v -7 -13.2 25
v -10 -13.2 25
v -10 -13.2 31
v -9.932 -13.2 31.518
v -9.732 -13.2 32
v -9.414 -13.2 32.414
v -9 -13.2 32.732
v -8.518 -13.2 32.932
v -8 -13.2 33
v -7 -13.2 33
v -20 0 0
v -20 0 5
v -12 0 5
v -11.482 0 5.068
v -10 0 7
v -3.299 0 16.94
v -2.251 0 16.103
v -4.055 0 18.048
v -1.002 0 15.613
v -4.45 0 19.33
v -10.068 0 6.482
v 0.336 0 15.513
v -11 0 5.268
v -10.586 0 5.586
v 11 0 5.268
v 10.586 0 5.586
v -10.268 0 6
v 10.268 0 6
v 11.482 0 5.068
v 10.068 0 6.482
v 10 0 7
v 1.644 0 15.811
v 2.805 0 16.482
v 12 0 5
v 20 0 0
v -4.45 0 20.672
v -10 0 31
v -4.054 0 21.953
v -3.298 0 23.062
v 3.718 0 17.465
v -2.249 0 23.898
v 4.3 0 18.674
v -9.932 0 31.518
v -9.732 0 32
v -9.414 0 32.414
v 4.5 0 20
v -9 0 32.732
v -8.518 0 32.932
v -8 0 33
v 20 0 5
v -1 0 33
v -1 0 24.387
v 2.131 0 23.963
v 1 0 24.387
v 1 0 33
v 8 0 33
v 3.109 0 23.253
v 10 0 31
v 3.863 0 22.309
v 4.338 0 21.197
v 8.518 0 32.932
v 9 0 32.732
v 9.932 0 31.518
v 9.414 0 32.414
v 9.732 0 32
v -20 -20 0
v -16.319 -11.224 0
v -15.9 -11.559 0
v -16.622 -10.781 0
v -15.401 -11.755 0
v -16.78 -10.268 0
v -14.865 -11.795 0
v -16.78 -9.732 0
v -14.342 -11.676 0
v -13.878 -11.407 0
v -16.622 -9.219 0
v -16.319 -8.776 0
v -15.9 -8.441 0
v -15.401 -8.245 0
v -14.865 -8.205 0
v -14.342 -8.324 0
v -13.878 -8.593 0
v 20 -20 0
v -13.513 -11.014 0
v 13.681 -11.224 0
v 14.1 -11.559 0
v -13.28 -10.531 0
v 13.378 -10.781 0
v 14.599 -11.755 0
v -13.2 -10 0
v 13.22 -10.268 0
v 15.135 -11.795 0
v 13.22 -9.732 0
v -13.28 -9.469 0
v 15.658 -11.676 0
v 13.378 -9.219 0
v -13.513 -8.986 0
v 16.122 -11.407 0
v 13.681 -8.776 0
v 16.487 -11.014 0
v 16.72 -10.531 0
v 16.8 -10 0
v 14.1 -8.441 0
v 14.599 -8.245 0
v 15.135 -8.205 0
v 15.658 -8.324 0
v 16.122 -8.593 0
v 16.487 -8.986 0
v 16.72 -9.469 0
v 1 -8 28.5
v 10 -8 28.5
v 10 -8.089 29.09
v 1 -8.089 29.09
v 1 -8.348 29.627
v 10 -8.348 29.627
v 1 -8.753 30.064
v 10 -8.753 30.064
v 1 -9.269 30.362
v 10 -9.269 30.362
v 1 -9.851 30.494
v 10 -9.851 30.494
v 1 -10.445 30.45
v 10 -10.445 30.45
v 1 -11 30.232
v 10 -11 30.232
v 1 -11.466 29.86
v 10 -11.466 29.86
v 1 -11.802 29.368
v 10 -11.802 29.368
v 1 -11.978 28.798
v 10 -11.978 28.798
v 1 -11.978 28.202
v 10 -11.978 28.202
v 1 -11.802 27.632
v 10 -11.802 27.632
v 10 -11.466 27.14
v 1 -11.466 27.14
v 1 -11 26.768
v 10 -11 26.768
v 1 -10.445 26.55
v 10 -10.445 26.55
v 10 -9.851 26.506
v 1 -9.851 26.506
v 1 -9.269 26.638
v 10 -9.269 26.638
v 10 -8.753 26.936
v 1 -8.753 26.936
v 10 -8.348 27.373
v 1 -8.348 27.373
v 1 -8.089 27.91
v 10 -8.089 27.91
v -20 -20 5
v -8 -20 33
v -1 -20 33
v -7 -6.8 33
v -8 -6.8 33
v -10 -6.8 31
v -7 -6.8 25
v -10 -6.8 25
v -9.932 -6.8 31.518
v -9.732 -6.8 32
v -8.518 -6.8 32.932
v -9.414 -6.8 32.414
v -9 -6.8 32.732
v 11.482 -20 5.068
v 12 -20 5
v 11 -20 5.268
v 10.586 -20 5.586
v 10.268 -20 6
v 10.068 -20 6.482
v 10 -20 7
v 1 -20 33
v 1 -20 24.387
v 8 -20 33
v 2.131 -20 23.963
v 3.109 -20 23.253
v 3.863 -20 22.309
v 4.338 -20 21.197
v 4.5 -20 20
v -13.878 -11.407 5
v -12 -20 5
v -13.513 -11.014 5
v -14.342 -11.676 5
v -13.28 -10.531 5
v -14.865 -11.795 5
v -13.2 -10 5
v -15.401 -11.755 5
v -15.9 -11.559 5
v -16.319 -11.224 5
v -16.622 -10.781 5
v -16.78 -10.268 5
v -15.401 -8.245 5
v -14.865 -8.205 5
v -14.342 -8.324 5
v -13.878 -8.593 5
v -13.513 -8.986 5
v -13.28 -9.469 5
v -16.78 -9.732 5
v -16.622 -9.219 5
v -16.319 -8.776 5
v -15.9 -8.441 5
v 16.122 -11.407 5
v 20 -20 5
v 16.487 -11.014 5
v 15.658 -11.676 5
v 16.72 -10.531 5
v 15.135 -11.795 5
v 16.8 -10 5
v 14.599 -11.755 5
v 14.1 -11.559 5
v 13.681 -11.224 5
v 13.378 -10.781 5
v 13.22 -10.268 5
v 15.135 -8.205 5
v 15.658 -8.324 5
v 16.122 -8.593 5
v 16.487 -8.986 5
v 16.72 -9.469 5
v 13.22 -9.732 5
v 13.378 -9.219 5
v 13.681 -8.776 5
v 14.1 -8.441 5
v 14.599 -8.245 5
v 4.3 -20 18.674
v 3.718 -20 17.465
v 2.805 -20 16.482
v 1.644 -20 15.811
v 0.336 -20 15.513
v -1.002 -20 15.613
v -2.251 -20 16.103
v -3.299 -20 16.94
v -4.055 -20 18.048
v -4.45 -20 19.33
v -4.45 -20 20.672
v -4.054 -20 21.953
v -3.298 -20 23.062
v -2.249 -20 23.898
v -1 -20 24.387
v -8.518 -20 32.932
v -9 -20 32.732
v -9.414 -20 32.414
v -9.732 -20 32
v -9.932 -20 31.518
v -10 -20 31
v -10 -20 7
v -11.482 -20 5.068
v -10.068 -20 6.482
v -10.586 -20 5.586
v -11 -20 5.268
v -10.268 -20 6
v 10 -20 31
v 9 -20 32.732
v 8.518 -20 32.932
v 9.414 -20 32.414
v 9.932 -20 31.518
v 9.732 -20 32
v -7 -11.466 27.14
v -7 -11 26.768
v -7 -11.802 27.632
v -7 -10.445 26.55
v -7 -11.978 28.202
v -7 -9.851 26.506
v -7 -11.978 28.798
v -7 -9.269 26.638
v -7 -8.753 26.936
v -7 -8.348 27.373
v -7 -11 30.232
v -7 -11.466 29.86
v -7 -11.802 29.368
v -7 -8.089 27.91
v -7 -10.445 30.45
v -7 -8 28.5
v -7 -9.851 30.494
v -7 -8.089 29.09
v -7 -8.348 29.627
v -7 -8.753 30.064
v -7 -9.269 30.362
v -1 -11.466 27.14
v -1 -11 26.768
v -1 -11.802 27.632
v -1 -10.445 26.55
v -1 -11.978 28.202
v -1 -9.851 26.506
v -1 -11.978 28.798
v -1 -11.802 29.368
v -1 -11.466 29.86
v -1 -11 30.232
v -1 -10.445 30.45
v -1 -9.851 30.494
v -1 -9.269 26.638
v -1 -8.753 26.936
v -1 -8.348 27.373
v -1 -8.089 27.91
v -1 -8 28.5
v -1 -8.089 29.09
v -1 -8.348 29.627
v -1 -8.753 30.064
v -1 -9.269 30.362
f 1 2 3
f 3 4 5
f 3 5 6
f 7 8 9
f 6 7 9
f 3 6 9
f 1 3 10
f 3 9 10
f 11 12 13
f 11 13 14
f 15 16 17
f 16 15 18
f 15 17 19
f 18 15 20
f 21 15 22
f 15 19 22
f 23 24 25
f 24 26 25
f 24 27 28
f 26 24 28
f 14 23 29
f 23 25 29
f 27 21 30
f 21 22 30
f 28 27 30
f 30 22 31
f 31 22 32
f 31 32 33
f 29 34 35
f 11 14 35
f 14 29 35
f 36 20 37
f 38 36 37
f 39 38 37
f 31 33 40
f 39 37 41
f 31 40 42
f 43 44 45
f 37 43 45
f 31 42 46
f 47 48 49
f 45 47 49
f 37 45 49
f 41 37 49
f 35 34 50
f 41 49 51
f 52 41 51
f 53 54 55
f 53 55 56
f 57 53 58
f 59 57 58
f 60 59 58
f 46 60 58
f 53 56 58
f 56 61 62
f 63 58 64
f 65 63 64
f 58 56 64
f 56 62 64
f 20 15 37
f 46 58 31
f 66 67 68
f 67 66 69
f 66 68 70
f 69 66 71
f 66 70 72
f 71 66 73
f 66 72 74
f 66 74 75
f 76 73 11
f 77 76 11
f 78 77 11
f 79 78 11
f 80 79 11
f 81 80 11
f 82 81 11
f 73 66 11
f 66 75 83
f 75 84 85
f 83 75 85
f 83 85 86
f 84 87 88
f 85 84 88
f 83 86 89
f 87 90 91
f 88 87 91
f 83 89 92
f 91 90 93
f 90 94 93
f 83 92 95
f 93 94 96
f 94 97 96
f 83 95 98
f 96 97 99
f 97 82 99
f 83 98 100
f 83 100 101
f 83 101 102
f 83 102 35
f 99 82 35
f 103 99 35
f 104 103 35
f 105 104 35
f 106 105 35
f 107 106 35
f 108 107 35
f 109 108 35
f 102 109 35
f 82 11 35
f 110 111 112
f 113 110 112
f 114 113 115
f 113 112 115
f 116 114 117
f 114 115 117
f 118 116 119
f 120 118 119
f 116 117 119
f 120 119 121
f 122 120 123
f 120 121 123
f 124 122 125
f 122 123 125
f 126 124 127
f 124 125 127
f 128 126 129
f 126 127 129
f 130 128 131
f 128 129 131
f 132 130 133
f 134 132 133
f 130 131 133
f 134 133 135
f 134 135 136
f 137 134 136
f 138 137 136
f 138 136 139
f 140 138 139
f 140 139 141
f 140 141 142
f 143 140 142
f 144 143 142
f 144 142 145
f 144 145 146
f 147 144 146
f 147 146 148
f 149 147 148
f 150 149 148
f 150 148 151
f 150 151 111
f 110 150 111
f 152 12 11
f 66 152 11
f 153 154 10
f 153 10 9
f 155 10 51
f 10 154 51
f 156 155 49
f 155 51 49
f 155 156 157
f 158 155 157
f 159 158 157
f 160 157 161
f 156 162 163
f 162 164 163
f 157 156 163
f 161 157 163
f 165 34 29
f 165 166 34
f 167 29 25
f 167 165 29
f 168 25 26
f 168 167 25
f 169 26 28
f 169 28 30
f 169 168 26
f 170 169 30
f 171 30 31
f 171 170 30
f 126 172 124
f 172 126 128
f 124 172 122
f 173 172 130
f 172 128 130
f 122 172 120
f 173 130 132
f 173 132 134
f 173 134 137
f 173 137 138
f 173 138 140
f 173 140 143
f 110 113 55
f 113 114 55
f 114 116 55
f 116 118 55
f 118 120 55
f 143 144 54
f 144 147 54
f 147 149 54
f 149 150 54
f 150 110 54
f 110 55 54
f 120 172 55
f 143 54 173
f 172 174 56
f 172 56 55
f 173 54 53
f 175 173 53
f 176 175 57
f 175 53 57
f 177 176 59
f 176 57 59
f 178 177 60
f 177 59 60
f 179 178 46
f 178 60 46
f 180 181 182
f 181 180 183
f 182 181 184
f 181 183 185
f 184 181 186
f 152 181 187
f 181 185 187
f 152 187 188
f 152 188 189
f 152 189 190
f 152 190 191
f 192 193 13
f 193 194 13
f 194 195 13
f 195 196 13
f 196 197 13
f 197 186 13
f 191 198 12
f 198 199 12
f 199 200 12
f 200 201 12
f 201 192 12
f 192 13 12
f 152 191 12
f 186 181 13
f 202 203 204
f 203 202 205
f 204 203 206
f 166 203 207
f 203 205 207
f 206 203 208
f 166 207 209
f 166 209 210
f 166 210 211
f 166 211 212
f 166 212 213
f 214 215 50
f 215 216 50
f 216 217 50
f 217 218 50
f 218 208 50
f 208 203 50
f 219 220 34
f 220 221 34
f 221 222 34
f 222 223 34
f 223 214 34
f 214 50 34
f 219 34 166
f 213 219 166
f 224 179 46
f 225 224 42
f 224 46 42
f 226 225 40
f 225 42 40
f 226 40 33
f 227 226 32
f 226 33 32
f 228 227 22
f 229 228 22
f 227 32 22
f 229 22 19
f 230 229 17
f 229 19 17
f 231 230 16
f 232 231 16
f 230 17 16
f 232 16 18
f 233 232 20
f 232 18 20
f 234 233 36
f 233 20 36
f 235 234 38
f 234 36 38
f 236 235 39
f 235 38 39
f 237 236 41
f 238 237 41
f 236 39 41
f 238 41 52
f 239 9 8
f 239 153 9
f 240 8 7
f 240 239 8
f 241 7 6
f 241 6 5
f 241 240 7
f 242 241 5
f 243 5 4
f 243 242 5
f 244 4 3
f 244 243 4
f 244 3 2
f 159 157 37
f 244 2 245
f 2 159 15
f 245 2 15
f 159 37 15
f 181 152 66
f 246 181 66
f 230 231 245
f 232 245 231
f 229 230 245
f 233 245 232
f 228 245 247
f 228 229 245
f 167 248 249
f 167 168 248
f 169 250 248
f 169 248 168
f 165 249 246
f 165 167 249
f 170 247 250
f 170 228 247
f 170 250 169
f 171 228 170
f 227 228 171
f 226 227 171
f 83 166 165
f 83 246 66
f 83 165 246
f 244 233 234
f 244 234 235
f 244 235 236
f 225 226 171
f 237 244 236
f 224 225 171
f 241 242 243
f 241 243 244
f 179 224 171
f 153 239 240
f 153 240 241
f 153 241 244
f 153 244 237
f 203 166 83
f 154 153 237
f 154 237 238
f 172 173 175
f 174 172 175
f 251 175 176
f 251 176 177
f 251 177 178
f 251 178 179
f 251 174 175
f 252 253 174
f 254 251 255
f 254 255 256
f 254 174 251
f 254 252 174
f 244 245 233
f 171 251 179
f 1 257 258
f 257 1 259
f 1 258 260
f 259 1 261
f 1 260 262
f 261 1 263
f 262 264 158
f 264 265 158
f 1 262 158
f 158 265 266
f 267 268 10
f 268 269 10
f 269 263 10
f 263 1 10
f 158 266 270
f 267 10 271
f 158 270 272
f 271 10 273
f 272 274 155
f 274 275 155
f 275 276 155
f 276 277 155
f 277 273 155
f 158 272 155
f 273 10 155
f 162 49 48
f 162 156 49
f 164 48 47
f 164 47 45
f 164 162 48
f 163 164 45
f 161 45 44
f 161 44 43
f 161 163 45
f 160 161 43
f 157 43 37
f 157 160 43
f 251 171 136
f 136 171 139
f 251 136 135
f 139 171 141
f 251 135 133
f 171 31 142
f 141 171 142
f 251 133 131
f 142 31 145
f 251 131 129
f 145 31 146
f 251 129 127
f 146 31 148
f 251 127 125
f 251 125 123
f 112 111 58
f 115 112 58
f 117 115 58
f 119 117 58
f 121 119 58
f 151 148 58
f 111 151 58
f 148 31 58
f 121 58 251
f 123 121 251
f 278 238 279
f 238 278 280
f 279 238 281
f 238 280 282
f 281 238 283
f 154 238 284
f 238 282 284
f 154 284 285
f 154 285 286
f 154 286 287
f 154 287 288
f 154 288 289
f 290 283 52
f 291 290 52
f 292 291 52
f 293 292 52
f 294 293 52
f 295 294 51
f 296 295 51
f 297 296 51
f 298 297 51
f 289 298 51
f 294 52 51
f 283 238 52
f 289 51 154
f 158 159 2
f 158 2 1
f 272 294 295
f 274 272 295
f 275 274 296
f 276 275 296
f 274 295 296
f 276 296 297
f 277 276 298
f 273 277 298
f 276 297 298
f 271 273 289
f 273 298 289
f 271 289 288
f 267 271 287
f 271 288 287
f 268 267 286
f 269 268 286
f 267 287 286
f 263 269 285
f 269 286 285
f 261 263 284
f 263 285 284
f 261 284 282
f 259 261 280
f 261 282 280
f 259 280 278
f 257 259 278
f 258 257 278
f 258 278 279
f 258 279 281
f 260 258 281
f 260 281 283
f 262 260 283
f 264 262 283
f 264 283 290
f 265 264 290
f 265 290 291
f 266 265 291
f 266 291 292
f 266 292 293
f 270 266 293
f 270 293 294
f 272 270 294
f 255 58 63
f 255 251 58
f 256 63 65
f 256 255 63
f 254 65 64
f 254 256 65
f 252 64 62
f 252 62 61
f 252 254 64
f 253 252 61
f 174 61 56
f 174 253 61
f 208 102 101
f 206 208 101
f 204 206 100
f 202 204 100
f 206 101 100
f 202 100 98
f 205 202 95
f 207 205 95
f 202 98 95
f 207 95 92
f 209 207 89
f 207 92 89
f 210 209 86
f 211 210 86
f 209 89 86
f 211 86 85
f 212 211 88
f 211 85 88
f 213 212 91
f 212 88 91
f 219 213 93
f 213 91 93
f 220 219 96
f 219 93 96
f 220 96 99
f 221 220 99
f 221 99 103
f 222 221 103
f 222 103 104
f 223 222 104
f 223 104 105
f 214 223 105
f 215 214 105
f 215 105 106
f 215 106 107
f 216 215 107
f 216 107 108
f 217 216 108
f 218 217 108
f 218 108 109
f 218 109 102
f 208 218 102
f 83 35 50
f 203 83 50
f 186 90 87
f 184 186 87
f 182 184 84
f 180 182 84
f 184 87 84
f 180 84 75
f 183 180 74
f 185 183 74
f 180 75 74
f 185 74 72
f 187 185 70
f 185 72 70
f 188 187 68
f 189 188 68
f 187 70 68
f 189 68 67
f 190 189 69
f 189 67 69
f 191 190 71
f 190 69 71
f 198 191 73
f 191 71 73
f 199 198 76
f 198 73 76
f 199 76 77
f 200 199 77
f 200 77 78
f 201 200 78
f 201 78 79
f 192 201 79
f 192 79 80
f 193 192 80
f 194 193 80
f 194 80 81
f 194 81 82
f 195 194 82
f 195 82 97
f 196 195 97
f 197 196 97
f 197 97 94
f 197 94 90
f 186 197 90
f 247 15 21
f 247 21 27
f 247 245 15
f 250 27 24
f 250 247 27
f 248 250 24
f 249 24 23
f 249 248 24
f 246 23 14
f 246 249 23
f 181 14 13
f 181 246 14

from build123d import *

# Parameters (mm, degrees)
F1_DEPTH = 20
F2_R     = 2
F3_DEPTH = 25
F5_DEPTH = 8
F6_R     = 1.8
F7_DEPTH = 25
F8_R     = 2


with BuildPart() as f1:
    # F0 (on Front) → F1 (new body)
    with BuildSketch(Plane.XZ):
        with BuildLine():
            Line((-1, 33), (-10, 33))
            Line((-10, 33), (-10, 5))
            Line((-10, 5), (-20, 5))
            Line((-20, 5), (-20, 0))
            Line((-20, 0), (20, 0))
            Line((20, 0), (20, 5))
            Line((20, 5), (10, 5))
            Line((10, 5), (10, 33))
            Line((10, 33), (1, 33))
            Line((1, 33), (1, 24.3874821937))
            ThreePointArc((1, 24.3874821937), (3.5178118199, 22.8062430401), (4.5, 20))
            ThreePointArc((4.5, 20), (-2.8062430401, 16.4821881801), (-1, 24.3874821937))
            Line((-1, 24.3874821937), (-1, 33))
        make_face()
    extrude(amount=F1_DEPTH)

    # F2 (on face) → F3 (cut)
    with BuildSketch(Plane.YZ.offset(10)):
        with Locations((-10, 28.5)):
            Circle(F2_R)
    extrude(amount=-F3_DEPTH, mode=Mode.SUBTRACT)

    # F4 (on face) → F5 (cut)
    with BuildSketch(Plane.XY.offset(33)):
        Polygon((-7, -6.8), (-10, -6.8), (-10, -13.2), (-7, -13.2), (-7, -10), align=None)
    extrude(amount=-F5_DEPTH, mode=Mode.SUBTRACT)

    # F6 (on face) → F7 (cut)
    with BuildSketch(Plane(origin=(0, 0, 0), x_dir=(1, 0, 0), z_dir=(0, 0, -1))):
        with Locations((-15, 10)):
            Circle(F6_R)
        with Locations((15, 10)):
            Circle(F6_R)
    extrude(amount=-F7_DEPTH, mode=Mode.SUBTRACT)

    # F8
    f8_edges = [f1.edges().sort_by_distance(p)[0] for p in [
        (-10, -10, 5),
        (10, -10, 5),
        (-10, -16.6, 33),
        (10, -10, 33),
        (-10, -3.4, 33),
    ]]
    fillet(f8_edges, radius=F8_R)


solid = f1.part
